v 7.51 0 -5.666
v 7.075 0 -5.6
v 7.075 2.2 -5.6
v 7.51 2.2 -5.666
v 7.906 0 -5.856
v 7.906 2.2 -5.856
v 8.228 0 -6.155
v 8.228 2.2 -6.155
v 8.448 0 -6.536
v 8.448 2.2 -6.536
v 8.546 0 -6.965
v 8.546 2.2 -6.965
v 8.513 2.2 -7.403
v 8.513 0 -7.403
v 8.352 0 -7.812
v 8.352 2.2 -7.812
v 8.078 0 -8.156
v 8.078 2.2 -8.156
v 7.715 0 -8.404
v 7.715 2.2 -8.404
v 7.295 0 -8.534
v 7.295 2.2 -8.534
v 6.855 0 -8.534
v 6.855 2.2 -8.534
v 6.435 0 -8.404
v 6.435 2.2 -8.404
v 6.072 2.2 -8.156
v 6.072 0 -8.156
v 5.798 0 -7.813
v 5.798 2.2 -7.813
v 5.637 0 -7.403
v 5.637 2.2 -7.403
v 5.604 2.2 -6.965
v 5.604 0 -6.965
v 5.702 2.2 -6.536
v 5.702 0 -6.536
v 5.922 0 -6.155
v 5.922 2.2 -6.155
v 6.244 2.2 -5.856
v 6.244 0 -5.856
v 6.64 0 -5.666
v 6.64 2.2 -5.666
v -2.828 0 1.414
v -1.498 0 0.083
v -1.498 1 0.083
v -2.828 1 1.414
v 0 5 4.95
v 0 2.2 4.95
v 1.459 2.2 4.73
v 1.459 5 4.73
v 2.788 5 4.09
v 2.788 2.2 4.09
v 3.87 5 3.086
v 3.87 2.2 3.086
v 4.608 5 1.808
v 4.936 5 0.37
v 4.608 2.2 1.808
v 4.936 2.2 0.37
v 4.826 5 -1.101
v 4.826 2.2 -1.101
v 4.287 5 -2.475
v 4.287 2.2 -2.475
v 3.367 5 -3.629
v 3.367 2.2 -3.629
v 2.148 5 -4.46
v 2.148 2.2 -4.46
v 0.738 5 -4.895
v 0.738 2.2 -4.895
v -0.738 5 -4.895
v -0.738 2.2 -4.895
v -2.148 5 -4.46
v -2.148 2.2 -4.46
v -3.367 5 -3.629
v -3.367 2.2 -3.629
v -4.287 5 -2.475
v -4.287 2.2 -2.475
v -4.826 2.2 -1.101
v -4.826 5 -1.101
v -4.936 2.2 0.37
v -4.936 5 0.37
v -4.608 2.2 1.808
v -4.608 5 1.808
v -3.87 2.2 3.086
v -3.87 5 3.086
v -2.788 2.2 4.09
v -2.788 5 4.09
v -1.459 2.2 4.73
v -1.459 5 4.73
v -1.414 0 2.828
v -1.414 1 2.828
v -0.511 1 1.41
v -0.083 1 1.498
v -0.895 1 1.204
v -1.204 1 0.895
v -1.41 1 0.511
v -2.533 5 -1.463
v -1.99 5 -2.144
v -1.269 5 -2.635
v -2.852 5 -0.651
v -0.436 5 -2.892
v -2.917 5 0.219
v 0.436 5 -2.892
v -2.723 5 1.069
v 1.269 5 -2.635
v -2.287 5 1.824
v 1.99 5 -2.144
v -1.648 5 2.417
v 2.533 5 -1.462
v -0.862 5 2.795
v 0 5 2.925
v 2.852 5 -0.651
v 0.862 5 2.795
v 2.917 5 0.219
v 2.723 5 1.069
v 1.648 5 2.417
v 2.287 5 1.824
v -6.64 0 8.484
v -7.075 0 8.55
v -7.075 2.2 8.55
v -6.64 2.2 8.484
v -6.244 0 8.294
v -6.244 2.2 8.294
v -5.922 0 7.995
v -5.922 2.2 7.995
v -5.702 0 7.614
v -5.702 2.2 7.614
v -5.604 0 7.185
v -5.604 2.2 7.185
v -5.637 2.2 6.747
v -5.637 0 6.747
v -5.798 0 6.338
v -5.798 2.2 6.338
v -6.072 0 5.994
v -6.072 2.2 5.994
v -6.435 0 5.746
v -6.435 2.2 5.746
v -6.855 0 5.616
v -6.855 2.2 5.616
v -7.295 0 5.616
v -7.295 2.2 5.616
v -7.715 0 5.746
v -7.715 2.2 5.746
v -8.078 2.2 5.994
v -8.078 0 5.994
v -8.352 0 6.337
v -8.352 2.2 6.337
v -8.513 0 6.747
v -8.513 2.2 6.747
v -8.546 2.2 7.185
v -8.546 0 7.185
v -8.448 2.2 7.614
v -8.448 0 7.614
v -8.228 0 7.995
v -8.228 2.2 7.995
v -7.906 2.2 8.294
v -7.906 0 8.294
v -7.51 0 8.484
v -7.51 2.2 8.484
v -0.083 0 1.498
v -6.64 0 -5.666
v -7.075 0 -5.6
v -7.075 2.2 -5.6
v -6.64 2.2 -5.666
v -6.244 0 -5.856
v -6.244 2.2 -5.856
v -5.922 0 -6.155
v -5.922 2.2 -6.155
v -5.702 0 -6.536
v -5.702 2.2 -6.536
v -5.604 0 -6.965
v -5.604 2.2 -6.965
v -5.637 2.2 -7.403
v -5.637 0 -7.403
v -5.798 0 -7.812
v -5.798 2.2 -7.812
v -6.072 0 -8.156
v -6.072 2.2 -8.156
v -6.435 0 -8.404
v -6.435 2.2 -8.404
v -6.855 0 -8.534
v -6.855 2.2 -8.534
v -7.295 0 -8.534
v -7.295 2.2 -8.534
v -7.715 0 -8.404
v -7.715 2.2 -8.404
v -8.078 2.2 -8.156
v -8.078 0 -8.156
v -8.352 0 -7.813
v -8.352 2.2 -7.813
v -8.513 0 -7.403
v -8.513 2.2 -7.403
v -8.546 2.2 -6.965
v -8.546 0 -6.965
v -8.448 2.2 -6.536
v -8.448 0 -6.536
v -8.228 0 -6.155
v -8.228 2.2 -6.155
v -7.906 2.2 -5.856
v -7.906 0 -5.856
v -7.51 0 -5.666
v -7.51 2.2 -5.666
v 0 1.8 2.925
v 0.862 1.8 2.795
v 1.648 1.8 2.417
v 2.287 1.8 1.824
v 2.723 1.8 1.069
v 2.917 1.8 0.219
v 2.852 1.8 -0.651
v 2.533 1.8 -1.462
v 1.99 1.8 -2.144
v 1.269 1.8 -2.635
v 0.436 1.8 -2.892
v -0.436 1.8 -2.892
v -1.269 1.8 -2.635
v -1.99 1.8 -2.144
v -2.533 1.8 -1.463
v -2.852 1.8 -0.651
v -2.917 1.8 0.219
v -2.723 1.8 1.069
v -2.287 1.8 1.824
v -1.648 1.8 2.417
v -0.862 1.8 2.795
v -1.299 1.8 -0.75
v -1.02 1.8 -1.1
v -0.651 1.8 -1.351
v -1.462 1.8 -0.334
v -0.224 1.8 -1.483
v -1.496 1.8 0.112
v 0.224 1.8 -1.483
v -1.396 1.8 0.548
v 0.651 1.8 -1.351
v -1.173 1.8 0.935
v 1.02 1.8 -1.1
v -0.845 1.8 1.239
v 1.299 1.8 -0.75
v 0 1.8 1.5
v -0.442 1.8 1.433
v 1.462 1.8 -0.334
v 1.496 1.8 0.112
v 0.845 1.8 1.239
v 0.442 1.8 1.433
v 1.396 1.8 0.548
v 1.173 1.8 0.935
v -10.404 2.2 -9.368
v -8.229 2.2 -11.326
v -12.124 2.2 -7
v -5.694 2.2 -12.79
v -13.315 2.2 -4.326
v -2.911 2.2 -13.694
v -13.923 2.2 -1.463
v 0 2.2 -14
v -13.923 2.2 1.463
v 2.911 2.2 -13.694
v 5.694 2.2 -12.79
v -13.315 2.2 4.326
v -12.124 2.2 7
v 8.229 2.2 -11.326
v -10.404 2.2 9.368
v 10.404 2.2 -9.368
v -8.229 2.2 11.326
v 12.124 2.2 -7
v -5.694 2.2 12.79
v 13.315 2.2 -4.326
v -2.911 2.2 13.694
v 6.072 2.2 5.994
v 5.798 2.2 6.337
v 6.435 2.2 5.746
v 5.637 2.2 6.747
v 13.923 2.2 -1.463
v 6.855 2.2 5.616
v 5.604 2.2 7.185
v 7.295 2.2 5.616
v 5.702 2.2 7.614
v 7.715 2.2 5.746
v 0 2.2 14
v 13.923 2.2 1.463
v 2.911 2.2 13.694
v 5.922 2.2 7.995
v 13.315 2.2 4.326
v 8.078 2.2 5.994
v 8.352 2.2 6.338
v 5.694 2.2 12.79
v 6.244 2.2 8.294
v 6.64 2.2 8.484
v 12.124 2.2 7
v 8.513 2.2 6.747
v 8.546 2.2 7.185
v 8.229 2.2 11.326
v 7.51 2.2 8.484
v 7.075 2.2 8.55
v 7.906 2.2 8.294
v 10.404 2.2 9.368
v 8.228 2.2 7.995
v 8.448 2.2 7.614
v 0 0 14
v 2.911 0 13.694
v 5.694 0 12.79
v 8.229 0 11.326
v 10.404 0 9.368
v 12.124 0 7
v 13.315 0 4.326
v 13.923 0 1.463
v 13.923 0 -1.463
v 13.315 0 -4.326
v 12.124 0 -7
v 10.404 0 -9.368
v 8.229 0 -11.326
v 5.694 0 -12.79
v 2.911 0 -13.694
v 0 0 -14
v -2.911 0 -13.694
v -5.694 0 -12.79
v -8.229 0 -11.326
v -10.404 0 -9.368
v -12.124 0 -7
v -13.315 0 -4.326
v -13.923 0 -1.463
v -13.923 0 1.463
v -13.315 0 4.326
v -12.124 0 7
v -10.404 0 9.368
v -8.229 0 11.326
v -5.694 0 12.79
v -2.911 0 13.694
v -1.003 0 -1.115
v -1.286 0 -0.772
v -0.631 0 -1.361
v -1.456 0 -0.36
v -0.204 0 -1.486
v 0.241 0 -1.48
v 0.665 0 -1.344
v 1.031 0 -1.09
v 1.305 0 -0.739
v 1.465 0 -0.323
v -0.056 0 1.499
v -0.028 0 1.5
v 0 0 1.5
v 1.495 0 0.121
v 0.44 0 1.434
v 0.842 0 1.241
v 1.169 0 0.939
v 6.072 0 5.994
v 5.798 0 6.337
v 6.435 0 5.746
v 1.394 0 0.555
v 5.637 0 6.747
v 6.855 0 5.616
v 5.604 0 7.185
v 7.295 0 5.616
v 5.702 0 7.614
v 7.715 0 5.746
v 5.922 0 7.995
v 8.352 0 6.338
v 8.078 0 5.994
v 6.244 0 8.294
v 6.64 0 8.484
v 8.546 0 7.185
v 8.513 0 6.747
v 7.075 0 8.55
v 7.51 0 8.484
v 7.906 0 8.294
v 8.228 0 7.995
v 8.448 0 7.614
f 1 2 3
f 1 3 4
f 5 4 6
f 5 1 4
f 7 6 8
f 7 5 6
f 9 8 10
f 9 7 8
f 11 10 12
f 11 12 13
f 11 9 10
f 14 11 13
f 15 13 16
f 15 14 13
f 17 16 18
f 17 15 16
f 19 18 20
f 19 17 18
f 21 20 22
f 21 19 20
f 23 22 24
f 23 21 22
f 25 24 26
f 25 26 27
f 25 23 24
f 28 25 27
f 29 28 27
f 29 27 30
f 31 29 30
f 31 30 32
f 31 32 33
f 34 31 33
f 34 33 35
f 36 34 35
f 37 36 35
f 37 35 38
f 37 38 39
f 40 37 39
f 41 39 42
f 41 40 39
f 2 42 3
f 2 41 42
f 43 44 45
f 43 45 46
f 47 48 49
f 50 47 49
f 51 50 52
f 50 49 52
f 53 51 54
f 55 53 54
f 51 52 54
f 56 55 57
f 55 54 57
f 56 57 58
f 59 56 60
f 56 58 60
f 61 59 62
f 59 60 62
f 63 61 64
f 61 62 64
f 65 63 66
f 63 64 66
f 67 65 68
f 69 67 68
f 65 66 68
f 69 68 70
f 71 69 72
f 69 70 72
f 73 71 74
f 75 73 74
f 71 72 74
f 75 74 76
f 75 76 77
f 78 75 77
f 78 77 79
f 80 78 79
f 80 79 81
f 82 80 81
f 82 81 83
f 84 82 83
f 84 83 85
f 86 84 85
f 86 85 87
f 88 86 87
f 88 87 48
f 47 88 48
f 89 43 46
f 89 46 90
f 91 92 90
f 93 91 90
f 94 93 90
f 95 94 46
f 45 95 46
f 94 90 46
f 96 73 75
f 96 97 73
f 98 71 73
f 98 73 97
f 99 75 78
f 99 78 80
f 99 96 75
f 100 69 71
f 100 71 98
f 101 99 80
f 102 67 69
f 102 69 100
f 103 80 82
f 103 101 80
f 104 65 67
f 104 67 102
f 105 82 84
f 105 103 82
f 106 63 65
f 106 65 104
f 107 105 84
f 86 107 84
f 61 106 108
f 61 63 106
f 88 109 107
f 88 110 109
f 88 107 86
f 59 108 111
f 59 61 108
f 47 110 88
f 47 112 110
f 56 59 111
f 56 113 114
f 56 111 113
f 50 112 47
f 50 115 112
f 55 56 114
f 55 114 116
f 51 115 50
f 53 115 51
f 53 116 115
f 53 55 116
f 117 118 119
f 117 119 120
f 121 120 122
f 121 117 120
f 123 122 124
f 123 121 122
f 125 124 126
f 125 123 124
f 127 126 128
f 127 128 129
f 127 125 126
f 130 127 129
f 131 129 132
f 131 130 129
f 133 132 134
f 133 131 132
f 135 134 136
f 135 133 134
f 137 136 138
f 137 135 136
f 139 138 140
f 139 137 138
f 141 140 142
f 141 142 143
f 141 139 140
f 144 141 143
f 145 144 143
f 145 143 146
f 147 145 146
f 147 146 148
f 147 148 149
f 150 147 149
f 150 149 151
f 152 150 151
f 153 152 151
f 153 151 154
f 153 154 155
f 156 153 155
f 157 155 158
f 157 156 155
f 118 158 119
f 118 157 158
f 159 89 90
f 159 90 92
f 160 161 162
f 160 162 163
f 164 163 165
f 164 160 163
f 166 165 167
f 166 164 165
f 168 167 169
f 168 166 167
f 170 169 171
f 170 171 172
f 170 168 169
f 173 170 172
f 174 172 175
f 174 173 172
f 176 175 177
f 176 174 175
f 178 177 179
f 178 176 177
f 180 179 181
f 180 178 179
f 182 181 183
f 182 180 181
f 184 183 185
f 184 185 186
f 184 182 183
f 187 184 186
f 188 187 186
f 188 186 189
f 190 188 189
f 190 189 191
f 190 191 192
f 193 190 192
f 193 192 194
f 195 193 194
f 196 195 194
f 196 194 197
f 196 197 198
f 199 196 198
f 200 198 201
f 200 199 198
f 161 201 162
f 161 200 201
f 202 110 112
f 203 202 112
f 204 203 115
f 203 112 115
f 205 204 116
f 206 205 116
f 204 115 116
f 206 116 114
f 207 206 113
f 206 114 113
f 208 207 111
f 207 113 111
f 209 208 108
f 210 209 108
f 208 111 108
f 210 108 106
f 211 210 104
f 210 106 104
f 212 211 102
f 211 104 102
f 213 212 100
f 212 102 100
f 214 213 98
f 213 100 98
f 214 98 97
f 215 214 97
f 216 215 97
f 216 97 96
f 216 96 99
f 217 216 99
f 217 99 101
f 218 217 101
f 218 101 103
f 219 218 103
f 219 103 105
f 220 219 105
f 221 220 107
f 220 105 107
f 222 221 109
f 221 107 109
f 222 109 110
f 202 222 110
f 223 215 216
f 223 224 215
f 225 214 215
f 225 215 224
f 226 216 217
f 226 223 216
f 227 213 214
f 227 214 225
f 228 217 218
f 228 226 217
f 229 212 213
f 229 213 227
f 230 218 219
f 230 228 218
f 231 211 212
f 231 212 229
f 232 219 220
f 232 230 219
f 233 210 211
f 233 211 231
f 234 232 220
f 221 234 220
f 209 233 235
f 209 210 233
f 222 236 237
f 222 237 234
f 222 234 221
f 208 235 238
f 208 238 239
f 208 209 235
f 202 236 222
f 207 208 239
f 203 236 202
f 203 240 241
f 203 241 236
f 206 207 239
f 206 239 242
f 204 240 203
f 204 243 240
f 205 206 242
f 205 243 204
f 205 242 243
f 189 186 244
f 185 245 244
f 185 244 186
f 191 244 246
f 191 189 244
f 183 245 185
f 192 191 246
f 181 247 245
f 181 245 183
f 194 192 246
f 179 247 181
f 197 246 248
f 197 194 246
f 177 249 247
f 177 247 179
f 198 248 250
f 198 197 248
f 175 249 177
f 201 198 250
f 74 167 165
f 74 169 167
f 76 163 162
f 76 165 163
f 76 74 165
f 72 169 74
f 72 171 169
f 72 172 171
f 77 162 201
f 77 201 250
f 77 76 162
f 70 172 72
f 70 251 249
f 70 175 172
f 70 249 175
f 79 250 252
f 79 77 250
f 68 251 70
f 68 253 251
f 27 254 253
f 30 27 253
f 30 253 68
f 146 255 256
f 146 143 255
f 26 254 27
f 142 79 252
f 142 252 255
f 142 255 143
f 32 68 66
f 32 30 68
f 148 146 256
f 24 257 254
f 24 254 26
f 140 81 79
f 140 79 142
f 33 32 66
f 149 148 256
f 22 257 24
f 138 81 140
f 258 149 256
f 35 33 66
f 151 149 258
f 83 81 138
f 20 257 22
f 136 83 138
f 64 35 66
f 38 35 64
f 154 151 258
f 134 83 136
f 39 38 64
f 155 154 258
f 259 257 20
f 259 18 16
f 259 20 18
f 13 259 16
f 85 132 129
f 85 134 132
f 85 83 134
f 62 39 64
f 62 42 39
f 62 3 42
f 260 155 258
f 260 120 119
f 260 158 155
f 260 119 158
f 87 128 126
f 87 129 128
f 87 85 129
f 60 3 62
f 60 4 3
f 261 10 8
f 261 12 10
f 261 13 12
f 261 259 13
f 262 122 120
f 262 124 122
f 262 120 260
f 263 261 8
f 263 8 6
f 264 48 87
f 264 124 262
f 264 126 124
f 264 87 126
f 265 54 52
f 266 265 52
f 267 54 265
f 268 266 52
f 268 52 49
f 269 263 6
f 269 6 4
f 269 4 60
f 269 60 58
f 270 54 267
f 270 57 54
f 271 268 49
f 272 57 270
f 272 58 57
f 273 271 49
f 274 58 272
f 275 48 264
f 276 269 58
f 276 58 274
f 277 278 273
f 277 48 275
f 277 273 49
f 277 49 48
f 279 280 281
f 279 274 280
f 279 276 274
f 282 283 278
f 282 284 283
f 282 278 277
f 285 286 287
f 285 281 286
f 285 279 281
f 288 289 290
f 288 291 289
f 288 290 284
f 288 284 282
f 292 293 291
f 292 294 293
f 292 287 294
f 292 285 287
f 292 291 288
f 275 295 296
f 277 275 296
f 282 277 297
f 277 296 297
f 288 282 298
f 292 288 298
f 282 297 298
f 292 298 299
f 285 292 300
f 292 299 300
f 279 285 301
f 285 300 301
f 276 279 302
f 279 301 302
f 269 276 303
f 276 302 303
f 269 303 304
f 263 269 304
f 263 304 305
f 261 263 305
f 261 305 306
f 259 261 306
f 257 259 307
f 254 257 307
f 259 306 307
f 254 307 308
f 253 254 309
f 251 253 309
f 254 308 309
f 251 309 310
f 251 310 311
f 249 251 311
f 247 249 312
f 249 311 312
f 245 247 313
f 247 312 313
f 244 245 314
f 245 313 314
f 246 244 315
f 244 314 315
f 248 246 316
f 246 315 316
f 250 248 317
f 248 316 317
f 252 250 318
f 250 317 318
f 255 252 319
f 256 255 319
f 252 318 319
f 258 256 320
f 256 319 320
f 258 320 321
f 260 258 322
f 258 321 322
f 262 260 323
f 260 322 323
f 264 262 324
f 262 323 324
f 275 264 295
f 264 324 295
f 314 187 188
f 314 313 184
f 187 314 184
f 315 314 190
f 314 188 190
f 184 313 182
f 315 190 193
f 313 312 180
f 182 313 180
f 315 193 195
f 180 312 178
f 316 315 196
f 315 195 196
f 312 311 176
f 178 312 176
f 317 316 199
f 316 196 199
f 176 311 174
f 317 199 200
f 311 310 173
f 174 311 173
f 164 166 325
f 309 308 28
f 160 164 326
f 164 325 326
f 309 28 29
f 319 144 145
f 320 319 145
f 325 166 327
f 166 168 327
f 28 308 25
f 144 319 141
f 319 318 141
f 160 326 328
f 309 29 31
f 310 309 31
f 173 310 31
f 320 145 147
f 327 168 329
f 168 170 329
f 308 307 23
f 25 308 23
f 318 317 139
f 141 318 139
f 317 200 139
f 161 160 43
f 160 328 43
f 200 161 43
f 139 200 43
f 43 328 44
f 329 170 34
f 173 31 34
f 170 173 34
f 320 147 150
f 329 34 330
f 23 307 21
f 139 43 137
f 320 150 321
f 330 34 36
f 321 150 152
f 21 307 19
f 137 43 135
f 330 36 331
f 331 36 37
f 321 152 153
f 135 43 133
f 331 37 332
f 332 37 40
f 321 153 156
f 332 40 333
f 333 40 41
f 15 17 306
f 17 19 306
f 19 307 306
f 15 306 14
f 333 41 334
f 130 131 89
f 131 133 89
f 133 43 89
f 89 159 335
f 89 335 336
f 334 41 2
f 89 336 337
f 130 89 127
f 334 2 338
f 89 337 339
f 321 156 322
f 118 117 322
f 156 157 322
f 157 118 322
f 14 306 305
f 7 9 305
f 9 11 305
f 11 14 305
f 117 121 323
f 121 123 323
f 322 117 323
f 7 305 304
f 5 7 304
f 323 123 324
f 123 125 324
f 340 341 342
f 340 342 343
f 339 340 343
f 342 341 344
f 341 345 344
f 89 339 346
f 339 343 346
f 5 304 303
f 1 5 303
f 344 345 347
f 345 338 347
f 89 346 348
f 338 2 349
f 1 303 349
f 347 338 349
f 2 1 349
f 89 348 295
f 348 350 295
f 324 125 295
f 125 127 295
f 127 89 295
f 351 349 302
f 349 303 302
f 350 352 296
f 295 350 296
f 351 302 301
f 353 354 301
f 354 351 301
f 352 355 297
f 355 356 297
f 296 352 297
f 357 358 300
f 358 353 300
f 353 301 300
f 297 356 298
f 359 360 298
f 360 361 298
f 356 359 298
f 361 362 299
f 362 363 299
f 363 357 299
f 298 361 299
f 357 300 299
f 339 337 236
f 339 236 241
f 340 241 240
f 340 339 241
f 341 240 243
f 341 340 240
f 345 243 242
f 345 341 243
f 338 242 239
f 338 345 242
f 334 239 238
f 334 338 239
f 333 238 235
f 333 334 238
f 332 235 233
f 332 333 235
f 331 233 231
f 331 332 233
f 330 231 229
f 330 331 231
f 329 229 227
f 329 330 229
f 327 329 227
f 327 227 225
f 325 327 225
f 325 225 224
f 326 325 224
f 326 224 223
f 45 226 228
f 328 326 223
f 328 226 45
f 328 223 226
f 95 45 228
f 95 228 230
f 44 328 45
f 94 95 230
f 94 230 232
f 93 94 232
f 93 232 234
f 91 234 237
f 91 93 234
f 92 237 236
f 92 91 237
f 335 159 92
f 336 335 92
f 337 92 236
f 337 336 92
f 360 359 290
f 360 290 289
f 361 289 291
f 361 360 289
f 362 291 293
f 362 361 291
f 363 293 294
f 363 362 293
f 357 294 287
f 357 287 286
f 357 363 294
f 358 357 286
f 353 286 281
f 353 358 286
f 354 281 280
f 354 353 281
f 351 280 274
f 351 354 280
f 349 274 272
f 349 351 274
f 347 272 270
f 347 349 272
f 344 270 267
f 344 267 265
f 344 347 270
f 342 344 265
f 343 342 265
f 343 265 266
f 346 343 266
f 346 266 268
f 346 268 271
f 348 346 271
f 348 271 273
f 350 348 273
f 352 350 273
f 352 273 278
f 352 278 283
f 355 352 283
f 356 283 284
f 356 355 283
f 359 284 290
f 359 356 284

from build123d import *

# Parameters (mm, degrees)
SKETCH_1_R          = 14
SKETCH_1_R_2        = 1.475
SKETCH_1_R_3        = 4.95
EXTRUDE_1_DEPTH     = 2.2
SKETCH_1_3_R        = 4.95
SKETCH_1_3_R_2      = 1.5
EXTRUDE_2_DEPTH     = 5
SKETCH_2_R          = 2.925
CUT_EXTRUDE_1_DEPTH = 3.2
CUT_EXTRUDE_2_DEPTH = 1


with BuildPart() as part:
    # 스케치1 → 보스-돌출1 (new body)
    with BuildSketch(Plane(origin=(0, 0, 0), x_dir=(1, 0, 0), z_dir=(0, 1, 0))):
        Circle(SKETCH_1_R)
        with Locations((-7.075, -7.075)):
            Circle(SKETCH_1_R_2, mode=Mode.SUBTRACT)
        with Locations((7.075, -7.075)):
            Circle(SKETCH_1_R_2, mode=Mode.SUBTRACT)
        with Locations((-7.075, 7.075)):
            Circle(SKETCH_1_R_2, mode=Mode.SUBTRACT)
        Circle(SKETCH_1_R_3, mode=Mode.SUBTRACT)
        with Locations((7.075, 7.075)):
            Circle(SKETCH_1_R_2, mode=Mode.SUBTRACT)
    extrude(amount=EXTRUDE_1_DEPTH)

    # 스케치1<3> → 보스-돌출2 (add)
    with BuildSketch(Plane(origin=(0, 0, 0), x_dir=(1, 0, 0), z_dir=(0, 1, 0))):
        Circle(SKETCH_1_3_R)
        Circle(SKETCH_1_3_R_2, mode=Mode.SUBTRACT)
    extrude(amount=EXTRUDE_2_DEPTH)

    # 스케치2 → 컷-돌출1 (cut)
    with BuildSketch(Plane(origin=(0, 5, 0), x_dir=(1, 0, 0), z_dir=(0, 1, 0))):
        Circle(SKETCH_2_R)
    extrude(amount=-CUT_EXTRUDE_1_DEPTH, mode=Mode.SUBTRACT)

    # 스케치3 → 컷-돌출2 (cut)
    with BuildSketch(Plane.XZ):
        Polygon((0.707106781, 0.707106781), (-0.707106781, -0.707106781), (-2.828427125, 1.414213562), (-1.414213562, 2.828427125), align=None)
    extrude(amount=-CUT_EXTRUDE_2_DEPTH, mode=Mode.SUBTRACT)


solid = part.part
